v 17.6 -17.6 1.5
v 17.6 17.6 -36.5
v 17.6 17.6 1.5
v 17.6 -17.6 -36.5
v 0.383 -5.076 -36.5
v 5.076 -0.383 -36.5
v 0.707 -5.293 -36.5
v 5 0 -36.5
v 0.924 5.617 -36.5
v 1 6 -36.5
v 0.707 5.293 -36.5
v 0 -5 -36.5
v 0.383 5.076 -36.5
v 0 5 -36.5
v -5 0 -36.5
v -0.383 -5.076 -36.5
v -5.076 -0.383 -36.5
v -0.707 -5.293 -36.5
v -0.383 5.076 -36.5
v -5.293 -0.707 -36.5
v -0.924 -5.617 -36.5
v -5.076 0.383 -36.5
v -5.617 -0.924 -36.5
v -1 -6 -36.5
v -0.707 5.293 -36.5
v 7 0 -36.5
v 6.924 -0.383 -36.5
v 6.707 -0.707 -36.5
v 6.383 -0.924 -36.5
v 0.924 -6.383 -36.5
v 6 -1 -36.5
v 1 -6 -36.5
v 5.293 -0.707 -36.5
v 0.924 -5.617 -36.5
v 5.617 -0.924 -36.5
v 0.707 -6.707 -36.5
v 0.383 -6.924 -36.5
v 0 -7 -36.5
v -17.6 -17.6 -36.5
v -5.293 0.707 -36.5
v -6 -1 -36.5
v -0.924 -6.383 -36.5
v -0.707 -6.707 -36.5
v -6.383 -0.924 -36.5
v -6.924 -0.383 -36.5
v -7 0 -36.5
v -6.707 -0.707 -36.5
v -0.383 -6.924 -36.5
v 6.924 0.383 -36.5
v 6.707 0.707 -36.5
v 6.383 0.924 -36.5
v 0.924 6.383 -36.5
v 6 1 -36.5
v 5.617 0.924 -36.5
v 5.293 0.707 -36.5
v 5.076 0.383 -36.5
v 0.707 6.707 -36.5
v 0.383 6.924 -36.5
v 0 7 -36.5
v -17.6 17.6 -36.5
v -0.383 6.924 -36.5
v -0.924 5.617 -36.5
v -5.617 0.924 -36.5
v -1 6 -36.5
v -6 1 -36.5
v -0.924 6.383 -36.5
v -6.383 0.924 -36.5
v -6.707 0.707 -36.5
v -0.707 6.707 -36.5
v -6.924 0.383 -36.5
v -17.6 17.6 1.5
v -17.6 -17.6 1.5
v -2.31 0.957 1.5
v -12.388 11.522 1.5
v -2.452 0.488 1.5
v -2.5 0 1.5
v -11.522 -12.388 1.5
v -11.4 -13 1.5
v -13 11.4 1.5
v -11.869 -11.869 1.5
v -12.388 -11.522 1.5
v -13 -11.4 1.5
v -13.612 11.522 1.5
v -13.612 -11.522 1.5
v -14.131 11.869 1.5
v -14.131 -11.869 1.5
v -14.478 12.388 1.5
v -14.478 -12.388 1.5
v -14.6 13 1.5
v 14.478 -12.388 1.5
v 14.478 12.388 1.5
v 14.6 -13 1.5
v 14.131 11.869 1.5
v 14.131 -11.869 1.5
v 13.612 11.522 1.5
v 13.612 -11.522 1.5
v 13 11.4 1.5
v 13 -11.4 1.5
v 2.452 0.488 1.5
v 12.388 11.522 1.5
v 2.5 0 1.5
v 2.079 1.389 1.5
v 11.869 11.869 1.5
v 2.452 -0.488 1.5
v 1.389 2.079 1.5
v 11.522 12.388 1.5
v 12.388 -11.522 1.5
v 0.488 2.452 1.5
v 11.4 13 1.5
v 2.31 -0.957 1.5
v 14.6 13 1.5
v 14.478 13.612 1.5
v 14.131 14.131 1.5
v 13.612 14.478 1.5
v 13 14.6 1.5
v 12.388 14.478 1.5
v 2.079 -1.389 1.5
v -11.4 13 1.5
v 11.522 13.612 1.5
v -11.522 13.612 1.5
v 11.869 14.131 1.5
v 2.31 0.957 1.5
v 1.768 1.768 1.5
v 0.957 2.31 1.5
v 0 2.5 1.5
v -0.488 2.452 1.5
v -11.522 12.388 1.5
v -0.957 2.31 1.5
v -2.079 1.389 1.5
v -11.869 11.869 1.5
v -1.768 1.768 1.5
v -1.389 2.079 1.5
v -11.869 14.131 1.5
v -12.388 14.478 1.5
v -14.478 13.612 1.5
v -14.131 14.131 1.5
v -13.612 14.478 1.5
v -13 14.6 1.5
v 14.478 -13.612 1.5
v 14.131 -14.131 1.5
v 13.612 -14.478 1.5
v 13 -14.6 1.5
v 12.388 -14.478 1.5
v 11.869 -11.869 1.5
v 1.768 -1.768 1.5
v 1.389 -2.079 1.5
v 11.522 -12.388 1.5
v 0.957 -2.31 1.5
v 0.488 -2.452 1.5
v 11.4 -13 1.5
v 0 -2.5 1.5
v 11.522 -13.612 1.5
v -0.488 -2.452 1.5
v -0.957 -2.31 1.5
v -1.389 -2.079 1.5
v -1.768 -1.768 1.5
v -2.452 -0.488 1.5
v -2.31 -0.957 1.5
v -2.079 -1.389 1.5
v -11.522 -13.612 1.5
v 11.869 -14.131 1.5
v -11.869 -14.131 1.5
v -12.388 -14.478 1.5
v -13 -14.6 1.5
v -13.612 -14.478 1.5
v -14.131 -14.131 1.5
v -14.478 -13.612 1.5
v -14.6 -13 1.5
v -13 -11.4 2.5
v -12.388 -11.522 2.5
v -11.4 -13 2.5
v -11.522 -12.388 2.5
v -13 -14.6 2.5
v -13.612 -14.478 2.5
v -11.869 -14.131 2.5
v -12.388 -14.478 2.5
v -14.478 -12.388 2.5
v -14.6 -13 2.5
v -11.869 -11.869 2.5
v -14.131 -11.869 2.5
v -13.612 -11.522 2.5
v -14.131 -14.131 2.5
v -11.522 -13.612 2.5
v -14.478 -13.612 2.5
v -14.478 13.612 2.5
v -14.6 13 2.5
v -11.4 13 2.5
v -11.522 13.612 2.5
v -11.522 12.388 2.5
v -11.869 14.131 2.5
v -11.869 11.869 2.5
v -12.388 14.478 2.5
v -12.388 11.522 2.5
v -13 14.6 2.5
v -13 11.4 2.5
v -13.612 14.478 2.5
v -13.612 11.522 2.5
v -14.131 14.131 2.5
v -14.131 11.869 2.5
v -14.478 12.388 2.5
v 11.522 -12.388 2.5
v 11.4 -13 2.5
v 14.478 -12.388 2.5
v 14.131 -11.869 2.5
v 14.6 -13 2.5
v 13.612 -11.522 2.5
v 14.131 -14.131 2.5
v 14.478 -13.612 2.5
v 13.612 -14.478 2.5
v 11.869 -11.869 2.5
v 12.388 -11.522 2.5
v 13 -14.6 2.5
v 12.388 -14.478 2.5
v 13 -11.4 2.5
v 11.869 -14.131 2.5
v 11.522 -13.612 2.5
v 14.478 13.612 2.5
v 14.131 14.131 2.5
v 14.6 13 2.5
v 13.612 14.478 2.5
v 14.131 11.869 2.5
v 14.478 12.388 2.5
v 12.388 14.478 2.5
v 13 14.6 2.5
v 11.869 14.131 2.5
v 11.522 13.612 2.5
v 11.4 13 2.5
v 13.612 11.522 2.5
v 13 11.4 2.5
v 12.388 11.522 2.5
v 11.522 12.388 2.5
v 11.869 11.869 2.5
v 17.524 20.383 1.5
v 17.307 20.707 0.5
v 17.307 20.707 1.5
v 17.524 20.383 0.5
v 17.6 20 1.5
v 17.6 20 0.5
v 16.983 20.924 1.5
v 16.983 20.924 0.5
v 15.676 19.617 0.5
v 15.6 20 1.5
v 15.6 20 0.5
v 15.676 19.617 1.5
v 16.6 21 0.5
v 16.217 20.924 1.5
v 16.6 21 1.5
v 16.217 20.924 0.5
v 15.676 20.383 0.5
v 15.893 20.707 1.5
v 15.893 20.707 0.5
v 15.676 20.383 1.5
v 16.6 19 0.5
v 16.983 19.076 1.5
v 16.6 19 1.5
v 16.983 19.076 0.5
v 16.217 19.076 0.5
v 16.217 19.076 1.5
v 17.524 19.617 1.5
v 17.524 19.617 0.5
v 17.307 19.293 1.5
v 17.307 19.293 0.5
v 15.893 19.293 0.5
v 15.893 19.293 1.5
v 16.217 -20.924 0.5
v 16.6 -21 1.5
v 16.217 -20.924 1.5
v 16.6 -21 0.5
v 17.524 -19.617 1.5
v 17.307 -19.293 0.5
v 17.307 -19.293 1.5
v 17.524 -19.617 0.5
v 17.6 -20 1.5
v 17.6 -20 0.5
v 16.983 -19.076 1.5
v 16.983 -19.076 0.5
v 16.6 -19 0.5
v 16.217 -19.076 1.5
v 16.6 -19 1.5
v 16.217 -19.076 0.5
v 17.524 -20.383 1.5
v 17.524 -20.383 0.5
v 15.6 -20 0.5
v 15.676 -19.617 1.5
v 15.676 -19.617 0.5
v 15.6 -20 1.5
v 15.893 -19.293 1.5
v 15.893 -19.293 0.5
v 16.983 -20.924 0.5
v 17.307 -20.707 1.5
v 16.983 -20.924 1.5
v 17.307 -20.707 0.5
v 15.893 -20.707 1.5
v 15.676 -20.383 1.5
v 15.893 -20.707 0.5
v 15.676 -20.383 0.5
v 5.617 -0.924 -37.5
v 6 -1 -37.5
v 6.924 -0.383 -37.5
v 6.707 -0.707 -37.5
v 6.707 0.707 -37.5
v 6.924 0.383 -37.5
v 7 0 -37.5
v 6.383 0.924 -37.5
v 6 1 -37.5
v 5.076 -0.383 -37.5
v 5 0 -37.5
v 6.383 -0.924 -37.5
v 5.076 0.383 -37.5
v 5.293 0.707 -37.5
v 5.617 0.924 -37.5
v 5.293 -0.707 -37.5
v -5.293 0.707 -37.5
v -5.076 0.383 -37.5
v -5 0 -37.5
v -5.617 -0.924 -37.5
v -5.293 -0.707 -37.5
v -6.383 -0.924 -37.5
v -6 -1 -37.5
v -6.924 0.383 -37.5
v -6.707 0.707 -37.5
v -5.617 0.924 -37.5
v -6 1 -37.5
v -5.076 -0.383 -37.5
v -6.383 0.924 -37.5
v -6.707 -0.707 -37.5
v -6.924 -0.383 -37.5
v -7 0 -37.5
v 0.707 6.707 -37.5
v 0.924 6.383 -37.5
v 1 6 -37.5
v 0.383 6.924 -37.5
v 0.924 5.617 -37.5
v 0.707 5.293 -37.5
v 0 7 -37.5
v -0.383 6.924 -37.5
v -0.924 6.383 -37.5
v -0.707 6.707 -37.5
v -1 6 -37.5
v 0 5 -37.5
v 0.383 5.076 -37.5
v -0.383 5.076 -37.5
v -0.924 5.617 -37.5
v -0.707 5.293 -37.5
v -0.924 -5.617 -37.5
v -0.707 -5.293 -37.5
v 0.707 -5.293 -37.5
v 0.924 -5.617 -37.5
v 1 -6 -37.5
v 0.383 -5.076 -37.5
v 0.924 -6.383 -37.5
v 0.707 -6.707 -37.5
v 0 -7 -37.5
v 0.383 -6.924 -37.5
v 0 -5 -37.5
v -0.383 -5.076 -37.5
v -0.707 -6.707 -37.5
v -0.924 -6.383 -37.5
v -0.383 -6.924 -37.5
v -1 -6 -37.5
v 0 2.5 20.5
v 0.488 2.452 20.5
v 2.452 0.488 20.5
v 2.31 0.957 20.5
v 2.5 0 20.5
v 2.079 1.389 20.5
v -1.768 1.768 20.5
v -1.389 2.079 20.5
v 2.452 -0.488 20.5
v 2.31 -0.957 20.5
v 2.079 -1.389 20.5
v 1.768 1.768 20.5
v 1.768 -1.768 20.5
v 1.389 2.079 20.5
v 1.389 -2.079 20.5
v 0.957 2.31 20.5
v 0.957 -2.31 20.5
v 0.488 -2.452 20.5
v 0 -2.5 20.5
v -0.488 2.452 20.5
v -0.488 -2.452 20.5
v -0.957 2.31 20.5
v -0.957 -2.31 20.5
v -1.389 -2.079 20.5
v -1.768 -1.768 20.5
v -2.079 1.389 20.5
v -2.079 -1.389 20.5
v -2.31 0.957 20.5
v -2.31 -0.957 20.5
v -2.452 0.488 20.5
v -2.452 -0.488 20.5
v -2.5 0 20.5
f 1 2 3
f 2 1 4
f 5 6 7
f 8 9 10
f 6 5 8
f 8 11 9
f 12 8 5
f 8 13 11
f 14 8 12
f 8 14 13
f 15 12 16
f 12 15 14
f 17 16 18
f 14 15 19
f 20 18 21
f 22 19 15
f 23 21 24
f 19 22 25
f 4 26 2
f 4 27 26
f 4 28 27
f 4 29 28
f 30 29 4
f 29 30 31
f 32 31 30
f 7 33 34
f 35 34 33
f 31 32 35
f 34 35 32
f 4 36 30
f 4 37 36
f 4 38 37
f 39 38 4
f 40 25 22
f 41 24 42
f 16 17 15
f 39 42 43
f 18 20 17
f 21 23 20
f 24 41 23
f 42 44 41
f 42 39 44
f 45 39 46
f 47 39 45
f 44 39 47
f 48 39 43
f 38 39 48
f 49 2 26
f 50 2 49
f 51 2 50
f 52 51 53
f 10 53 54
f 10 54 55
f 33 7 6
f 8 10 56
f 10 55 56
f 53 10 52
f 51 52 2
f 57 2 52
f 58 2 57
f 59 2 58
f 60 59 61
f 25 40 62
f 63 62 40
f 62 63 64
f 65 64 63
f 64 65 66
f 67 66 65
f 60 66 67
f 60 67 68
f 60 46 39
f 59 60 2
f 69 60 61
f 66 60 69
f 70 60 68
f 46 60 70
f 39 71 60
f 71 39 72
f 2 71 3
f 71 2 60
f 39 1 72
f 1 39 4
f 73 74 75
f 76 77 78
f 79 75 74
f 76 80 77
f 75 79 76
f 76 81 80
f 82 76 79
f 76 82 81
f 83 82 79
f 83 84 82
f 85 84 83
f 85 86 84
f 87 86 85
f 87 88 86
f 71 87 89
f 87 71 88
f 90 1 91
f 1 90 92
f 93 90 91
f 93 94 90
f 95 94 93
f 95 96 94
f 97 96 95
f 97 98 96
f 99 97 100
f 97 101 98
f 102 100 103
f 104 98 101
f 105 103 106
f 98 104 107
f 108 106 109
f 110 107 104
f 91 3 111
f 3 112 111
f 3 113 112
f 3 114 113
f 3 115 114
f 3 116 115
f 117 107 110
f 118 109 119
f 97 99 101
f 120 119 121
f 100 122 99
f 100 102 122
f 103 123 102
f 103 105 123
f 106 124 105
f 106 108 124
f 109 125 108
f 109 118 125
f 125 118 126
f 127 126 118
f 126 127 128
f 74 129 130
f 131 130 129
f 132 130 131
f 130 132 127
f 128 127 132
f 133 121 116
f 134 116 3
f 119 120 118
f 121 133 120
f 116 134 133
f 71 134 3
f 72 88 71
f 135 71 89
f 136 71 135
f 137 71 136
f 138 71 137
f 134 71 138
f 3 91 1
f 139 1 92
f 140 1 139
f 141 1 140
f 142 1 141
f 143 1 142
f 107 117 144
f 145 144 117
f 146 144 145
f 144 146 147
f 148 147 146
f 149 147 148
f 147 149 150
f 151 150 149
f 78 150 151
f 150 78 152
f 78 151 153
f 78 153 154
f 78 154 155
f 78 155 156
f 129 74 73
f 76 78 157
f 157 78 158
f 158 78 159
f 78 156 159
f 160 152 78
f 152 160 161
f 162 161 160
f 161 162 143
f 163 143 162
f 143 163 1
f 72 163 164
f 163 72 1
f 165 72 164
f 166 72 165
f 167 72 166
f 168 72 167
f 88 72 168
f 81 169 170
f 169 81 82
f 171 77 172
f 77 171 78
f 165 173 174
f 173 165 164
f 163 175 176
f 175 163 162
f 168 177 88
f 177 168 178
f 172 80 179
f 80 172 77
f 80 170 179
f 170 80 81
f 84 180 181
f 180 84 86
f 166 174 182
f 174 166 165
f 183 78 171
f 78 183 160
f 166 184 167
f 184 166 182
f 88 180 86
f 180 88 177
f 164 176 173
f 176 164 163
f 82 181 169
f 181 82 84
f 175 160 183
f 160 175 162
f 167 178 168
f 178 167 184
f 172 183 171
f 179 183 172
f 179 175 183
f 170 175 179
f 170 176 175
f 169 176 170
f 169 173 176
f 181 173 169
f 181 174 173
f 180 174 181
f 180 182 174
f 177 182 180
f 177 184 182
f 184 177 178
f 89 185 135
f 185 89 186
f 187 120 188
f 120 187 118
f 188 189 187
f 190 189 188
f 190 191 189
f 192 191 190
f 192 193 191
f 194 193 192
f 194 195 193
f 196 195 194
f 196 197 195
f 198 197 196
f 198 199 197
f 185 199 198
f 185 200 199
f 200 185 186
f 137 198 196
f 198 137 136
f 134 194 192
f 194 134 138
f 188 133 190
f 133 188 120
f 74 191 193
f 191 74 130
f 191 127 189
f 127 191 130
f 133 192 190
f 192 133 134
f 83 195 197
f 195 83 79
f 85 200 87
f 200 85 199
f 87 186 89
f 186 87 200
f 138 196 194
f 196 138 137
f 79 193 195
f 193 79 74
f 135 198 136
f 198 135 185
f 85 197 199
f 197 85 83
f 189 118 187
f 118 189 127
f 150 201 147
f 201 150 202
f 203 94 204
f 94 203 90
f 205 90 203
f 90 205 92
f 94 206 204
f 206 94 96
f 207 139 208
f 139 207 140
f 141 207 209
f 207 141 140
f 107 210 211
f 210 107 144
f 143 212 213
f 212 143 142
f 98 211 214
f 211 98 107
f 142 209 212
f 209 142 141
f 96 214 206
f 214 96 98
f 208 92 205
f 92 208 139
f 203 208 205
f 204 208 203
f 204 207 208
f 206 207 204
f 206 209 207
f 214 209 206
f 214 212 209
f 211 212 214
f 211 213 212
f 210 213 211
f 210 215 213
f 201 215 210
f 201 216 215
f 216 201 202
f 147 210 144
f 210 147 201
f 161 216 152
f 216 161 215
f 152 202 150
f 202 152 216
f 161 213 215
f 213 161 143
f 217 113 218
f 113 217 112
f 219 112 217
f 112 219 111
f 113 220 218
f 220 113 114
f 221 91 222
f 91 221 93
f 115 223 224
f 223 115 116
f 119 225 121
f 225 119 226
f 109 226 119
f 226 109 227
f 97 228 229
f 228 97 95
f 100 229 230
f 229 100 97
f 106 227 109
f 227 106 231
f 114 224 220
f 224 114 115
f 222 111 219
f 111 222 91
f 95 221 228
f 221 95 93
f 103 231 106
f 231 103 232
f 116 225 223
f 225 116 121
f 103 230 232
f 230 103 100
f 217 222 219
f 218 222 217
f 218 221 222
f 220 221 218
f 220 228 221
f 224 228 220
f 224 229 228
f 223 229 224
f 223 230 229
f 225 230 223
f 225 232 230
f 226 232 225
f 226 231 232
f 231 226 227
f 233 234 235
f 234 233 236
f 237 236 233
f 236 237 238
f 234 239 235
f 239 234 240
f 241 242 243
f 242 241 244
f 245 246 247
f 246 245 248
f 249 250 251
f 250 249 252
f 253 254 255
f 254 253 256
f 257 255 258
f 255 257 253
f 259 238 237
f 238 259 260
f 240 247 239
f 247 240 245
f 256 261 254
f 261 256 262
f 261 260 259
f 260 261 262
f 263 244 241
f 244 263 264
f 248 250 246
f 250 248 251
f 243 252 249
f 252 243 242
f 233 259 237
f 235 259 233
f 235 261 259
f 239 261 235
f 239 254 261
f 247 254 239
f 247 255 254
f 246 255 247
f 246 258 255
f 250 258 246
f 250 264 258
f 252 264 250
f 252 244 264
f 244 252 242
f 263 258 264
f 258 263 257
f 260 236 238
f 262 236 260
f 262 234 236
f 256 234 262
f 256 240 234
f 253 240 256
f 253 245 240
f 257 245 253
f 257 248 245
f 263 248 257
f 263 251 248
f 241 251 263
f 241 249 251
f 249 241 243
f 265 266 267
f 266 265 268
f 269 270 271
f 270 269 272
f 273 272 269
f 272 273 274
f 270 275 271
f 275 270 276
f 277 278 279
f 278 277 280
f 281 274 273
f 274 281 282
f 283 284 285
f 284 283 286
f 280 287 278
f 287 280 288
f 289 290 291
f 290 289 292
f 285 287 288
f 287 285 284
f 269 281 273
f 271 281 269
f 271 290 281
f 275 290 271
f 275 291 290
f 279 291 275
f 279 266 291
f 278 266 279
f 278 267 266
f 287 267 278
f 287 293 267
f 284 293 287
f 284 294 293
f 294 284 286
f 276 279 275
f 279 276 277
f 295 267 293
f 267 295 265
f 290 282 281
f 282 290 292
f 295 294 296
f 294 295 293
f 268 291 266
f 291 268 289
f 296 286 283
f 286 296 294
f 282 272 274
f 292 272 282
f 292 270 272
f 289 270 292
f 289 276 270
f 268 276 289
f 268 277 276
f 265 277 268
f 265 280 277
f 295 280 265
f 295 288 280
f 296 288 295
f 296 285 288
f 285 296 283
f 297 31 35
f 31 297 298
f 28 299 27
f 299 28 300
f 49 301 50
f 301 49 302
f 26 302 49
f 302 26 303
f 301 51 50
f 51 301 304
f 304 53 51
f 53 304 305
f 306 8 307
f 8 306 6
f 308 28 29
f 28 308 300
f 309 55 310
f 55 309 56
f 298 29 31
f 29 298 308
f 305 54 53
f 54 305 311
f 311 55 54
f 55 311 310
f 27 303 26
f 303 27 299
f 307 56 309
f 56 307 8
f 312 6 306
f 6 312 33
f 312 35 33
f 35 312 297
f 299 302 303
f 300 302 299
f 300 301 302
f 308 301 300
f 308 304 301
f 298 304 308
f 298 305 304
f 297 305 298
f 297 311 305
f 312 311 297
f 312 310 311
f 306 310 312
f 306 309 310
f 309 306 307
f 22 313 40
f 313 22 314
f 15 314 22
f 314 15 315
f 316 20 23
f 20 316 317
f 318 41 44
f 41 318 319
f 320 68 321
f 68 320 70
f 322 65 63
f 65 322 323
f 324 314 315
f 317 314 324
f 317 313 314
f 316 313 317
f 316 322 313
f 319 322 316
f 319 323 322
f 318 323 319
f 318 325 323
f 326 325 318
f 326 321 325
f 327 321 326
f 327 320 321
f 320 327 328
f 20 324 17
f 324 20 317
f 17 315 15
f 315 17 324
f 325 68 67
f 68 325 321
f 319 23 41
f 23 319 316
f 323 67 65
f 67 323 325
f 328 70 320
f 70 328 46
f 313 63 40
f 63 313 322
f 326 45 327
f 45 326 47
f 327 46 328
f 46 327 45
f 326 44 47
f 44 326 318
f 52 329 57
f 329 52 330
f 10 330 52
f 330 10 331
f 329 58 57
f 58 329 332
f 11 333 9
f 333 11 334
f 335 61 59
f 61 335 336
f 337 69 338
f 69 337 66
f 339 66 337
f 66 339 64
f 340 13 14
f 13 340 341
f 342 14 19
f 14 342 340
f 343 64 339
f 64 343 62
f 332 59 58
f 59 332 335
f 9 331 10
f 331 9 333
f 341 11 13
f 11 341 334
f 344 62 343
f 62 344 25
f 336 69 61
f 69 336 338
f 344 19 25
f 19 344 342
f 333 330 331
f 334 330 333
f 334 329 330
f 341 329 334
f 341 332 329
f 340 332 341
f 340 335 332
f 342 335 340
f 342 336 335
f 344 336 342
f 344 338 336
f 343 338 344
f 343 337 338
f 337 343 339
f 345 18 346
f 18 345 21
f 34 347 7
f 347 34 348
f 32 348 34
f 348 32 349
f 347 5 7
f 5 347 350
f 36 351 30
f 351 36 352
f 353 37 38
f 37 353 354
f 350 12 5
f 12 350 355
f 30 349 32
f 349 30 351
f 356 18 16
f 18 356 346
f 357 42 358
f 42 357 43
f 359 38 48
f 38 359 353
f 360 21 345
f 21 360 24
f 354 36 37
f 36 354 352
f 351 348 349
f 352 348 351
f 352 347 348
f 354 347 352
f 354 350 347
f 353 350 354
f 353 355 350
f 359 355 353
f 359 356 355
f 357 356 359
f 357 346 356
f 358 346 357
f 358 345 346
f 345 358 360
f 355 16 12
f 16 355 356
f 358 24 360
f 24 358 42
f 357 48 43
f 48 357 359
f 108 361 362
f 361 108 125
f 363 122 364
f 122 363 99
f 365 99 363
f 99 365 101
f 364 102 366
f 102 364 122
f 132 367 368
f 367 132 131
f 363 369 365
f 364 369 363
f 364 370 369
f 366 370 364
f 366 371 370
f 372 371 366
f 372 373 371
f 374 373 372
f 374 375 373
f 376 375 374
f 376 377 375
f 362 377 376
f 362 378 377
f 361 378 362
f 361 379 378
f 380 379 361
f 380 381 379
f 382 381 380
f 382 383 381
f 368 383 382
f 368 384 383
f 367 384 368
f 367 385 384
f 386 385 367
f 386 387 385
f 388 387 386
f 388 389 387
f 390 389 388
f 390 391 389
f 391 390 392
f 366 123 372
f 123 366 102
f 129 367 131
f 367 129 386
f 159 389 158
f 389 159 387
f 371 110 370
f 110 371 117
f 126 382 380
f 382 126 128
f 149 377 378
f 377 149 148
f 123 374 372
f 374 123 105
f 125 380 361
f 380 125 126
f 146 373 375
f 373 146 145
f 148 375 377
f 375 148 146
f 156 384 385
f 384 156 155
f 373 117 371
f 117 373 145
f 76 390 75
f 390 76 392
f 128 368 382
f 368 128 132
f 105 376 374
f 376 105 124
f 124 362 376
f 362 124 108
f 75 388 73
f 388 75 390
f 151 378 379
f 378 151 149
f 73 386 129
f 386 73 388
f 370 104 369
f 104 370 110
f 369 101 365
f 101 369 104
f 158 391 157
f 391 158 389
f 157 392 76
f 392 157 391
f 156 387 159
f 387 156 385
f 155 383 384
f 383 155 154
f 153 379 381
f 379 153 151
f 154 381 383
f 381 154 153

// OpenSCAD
// Parameters
face_width = 35.2; //[17.6:70.4:0.1]
body_length = 36.0; //[18.0:72.0:0.1]
face_thickness = 3.0; //[1.5:6.0:0.1]
shaft_diameter = 5.0; //[2.5:10.0:0.1]
shaft_length = 20.0; //[10.0:40.0:0.1]
shaft_offset_from_face = 0.0; //[-2.0:5.0:0.1]
mounting_hole_spacing = 26.0; //[13.0:52.0:0.1]
mounting_hole_diameter = 3.2; //[1.6:6.4:0.1]
hole_depth_extra = 2.0; //[1.0:6.0:0.1]
overlap = 1.0; //[0.5:2.0:0.1]
ttrack_length = 60.0; //[30.0:120.0:0.5]
ttrack_pitch = 20.0; //[10.0:40.0:0.5]
ttrack_num_insert_holes = 3; //[1:10:1]
rail_hole_spacing = 20.0; //[10.0:40.0:0.5]
grill_hole_spacing = 6.0; //[3.0:12.0:0.5]
helper_marker_diameter = 2.0; //[1.0:5.0:0.1]
helper_marker_height = 1.0; //[0.5:5.0:0.1]

// Motor Shaft - Detailed Geometry
module motor_shaft() {
  color("Silver") {
    translate([0, 0, face_thickness/2 + shaft_length/2 - overlap + shaft_offset_from_face])
      cylinder(d=shaft_diameter, h=shaft_length, center=true, $fn=32);
  }
}

// Ttrack Hole Positions - Detailed Geometry
module ttrack_hole_positions() {
  color("DimGray") {
    for (i = [0:ttrack_num_insert_holes-1]) {
      translate([face_width/2 - helper_marker_diameter/2, 
                 ttrack_length/2 - (ttrack_pitch/2 + i*ttrack_pitch), 
                 face_thickness/2 - helper_marker_height/2])
        cylinder(d=helper_marker_diameter, h=helper_marker_height, center=true, $fn=16);
    }
  }
}

// Ttrack Insert Hole Positions - Detailed Geometry
module ttrack_insert_hole_positions() {
  color("DimGray") {
    for (i = [1:ttrack_num_insert_holes]) {
      translate([ttrack_length/2 - (i*ttrack_length/(ttrack_num_insert_holes+1)), 
                 face_width/2 - helper_marker_diameter/2, 
                 face_thickness/2 - helper_marker_height/2])
        cylinder(d=helper_marker_diameter, h=helper_marker_height, center=true, $fn=16);
    }
  }
}

// Rail Hole Positions - Detailed Geometry
module rail_hole_positions() {
  color("DimGray") {
    translate([-face_width/2 + helper_marker_diameter/2, rail_hole_spacing/2, face_thickness/2 - helper_marker_height/2])
      cylinder(d=helper_marker_diameter, h=helper_marker_height, center=true, $fn=16);
    translate([-face_width/2 + helper_marker_diameter/2, -rail_hole_spacing/2, face_thickness/2 - helper_marker_height/2])
      cylinder(d=helper_marker_diameter, h=helper_marker_height, center=true, $fn=16);
  }
}

// Grill Hole Positions - Detailed Geometry
module grill_hole_positions() {
  color("DimGray") {
    translate([grill_hole_spacing, 0, -(face_thickness/2 + body_length - helper_marker_height/2)])
      cylinder(d=helper_marker_diameter, h=helper_marker_height, center=true, $fn=16);
    translate([-grill_hole_spacing, 0, -(face_thickness/2 + body_length - helper_marker_height/2)])
      cylinder(d=helper_marker_diameter, h=helper_marker_height, center=true, $fn=16);
    translate([0, grill_hole_spacing, -(face_thickness/2 + body_length - helper_marker_height/2)])
      cylinder(d=helper_marker_diameter, h=helper_marker_height, center=true, $fn=16);
    translate([0, -grill_hole_spacing, -(face_thickness/2 + body_length - helper_marker_height/2)])
      cylinder(d=helper_marker_diameter, h=helper_marker_height, center=true, $fn=16);
  }
}

// Assembly
module assembly() {
  // Motor Body and Face
  color("Black") {
    translate([0, 0, -(face_thickness/2 + body_length/2 - overlap)])
      cube([face_width, face_width, body_length], center=true);
    translate([0, 0, 0])
      cube([face_width, face_width, face_thickness], center=true);
  }
  
  // Mounting Holes
  color("Silver") {
    for (x = [-1, 1], y = [-1, 1]) {
      translate([x*mounting_hole_spacing/2, y*mounting_hole_spacing/2, 0])
        cylinder(d=mounting_hole_diameter, h=face_thickness + hole_depth_extra, center=true, $fn=16);
    }
  }
  
  // Motor Shaft
  motor_shaft();
  
  // Ttrack Hole Positions
  ttrack_hole_positions();
  
  // Ttrack Insert Hole Positions
  ttrack_insert_hole_positions();
  
  // Rail Hole Positions
  rail_hole_positions();
  
  // Grill Hole Positions
  grill_hole_positions();
}

assembly();
